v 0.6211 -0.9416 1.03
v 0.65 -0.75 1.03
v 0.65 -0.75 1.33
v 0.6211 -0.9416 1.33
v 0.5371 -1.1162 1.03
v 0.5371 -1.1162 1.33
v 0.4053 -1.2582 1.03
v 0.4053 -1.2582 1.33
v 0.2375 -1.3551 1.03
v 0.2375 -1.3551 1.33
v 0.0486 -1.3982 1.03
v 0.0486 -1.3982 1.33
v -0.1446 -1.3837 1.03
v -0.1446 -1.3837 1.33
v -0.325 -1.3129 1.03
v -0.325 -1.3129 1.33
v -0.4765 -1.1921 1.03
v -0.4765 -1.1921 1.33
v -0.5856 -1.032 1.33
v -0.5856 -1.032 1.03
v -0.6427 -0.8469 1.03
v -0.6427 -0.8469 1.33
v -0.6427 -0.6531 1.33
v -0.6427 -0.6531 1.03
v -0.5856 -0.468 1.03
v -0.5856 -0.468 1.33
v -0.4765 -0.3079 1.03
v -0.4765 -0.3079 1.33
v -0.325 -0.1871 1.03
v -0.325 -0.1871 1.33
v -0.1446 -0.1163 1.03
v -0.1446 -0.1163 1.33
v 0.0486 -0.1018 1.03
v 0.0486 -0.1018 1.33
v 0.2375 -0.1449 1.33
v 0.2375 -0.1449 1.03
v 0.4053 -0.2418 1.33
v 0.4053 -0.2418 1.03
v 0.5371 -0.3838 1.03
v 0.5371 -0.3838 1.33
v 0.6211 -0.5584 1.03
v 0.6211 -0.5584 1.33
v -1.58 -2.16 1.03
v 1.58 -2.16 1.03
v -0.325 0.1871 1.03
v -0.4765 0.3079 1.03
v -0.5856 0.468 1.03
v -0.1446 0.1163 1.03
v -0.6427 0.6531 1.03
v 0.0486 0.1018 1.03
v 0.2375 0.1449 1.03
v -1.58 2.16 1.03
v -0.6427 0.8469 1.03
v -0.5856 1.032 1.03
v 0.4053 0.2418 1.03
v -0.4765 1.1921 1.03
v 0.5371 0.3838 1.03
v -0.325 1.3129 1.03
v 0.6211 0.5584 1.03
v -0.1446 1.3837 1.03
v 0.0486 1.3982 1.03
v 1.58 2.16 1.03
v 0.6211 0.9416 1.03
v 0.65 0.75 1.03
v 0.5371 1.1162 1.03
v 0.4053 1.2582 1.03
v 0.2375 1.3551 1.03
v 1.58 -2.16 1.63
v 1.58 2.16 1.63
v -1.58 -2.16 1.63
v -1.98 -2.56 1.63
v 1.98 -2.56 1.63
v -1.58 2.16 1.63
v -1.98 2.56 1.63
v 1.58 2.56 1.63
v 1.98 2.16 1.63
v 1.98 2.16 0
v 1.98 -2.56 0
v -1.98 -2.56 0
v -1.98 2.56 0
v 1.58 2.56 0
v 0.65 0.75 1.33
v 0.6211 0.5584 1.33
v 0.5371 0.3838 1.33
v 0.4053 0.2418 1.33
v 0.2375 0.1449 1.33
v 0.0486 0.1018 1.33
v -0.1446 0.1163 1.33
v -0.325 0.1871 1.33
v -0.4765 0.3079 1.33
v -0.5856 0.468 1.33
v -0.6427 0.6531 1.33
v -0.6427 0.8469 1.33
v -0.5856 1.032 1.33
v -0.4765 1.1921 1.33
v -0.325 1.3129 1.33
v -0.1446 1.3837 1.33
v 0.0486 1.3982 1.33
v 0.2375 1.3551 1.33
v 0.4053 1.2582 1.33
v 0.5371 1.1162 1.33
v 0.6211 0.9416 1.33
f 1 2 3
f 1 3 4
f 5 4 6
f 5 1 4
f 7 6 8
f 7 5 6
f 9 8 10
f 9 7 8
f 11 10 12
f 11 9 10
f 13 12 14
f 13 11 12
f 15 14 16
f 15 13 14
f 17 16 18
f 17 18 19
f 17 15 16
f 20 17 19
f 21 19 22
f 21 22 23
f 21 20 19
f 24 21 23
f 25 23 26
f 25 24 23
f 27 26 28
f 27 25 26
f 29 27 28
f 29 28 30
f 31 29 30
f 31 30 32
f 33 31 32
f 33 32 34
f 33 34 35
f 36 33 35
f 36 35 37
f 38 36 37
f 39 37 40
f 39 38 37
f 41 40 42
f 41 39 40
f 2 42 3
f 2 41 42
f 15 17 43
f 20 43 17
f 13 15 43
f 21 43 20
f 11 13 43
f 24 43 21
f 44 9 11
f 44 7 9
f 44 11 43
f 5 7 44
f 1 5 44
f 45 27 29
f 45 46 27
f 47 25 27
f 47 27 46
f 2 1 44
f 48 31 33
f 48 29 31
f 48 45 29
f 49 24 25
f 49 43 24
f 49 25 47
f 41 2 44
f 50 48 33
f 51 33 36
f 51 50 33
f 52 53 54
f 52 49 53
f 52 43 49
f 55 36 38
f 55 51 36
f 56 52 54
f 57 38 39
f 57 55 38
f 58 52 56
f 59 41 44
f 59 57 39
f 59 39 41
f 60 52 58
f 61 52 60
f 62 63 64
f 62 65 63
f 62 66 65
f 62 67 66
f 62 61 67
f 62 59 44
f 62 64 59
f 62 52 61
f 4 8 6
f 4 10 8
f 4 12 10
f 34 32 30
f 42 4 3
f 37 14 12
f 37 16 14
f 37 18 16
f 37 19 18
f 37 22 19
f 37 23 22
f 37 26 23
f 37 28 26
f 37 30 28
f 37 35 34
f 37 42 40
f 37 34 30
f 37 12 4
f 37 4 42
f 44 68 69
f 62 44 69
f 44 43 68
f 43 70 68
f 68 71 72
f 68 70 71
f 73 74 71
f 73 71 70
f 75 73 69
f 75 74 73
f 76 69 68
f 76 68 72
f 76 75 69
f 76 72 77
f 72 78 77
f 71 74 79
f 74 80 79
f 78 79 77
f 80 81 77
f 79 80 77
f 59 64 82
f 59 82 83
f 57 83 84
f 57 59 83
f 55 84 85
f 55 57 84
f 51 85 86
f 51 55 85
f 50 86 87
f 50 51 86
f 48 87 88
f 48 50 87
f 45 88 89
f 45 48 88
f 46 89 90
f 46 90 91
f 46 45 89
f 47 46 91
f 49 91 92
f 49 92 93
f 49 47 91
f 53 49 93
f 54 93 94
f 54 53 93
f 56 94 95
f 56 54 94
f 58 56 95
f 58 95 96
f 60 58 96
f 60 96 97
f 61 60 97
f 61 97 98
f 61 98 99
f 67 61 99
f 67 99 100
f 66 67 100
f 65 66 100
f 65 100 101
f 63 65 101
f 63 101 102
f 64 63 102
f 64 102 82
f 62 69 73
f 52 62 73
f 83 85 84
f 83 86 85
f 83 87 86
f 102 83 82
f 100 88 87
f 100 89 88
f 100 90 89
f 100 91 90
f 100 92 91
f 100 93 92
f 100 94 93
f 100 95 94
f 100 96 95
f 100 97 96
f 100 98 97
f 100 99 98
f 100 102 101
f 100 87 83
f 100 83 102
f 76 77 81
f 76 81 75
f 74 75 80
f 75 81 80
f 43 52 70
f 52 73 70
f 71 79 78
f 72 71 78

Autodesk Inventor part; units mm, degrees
ref_plane "YZ Plane" through (0, 0, 0) normal (1, 0, 0) x (0, 1, 0)
ref_plane "XZ Plane" through (0, 0, 0) normal (0, 1, 0) x (-1, 0, 0)
ref_plane "XY Plane" through (0, 0, 0) normal (0, 0, 1) x (1, 0, 0)
sketch "Skizze1" plane through (0, 0, 0) normal (0, 0, 1) x (1, 0, 0)
  line L0 (-1.98, -2.56) -> (1.98, -2.56)
  line L1 (1.98, -2.56) -> (1.98, 2.56)
  line L2 (1.98, 2.56) -> (-1.98, 2.56)
  line L3 (-1.98, 2.56) -> (-1.98, -2.56)
  line L4 (-1.98, -2.56) -> (1.98, 2.56) construction
  line L5 (1.98, -2.56) -> (-1.98, 2.56) construction
  point P0 (0, 0)
  dimension "d0" = 3.96
  dimension "d1" = 5.12
extrude "Extrusion1" add sketch "Skizze1" along normal blind 1.63
sketch "Skizze2" plane through (0, 0, 1.63) normal (0, 0, 1) x (1, 0, 0)
  line L0 (-1.98, -2.56) -> (1.98, -2.56) projected
  line L1 (1.98, -2.56) -> (1.98, 2.56) projected
  line L2 (1.98, 2.56) -> (-1.98, 2.56) projected
  line L3 (-1.98, 2.56) -> (-1.98, -2.56) projected
  line L4 (-1.58, -2.16) -> (1.58, -2.16)
  line L5 (1.58, -2.16) -> (1.58, 2.16)
  line L6 (1.58, 2.16) -> (-1.58, 2.16)
  line L7 (-1.58, 2.16) -> (-1.58, -2.16)
  line L8 (-1.58, -2.16) -> (1.58, 2.16) construction
  line L9 (1.58, -2.16) -> (-1.58, 2.16) construction
  point P0 (0, 0)
  dimension "d4" = 0.4
  dimension "d5" = 0.4
extrude "Extrusion2" cut sketch "Skizze2" against normal blind 0.6 contours L7 L6 L5 L4
sketch "Skizze3" plane through (0, 0, 1.03) normal (0, 0, 1) x (1, 0, 0)
  line L0 (0, 3.584) -> (0, -3.584) projected
  circle A0 centre (0, 0.75) radius 0.65
  circle A1 centre (0, -0.75) radius 0.65
  line L1 (-2.772, 0) -> (2.772, 0) projected
  point P0 (0, 0)
  dimension "d8" = 1.3
  dimension "d9" = 1.3
  dimension "d10" = 1.5
extrude "Extrusion3" add sketch "Skizze3" along normal blind 0.3
chamfer "Fase1" distance 0.4 angle 45 1 edges at (1.98, 2.56, 0.815)
equation "\"d9\" = d8"
properties part number "AEDR-8300-1Wx Encoder"
